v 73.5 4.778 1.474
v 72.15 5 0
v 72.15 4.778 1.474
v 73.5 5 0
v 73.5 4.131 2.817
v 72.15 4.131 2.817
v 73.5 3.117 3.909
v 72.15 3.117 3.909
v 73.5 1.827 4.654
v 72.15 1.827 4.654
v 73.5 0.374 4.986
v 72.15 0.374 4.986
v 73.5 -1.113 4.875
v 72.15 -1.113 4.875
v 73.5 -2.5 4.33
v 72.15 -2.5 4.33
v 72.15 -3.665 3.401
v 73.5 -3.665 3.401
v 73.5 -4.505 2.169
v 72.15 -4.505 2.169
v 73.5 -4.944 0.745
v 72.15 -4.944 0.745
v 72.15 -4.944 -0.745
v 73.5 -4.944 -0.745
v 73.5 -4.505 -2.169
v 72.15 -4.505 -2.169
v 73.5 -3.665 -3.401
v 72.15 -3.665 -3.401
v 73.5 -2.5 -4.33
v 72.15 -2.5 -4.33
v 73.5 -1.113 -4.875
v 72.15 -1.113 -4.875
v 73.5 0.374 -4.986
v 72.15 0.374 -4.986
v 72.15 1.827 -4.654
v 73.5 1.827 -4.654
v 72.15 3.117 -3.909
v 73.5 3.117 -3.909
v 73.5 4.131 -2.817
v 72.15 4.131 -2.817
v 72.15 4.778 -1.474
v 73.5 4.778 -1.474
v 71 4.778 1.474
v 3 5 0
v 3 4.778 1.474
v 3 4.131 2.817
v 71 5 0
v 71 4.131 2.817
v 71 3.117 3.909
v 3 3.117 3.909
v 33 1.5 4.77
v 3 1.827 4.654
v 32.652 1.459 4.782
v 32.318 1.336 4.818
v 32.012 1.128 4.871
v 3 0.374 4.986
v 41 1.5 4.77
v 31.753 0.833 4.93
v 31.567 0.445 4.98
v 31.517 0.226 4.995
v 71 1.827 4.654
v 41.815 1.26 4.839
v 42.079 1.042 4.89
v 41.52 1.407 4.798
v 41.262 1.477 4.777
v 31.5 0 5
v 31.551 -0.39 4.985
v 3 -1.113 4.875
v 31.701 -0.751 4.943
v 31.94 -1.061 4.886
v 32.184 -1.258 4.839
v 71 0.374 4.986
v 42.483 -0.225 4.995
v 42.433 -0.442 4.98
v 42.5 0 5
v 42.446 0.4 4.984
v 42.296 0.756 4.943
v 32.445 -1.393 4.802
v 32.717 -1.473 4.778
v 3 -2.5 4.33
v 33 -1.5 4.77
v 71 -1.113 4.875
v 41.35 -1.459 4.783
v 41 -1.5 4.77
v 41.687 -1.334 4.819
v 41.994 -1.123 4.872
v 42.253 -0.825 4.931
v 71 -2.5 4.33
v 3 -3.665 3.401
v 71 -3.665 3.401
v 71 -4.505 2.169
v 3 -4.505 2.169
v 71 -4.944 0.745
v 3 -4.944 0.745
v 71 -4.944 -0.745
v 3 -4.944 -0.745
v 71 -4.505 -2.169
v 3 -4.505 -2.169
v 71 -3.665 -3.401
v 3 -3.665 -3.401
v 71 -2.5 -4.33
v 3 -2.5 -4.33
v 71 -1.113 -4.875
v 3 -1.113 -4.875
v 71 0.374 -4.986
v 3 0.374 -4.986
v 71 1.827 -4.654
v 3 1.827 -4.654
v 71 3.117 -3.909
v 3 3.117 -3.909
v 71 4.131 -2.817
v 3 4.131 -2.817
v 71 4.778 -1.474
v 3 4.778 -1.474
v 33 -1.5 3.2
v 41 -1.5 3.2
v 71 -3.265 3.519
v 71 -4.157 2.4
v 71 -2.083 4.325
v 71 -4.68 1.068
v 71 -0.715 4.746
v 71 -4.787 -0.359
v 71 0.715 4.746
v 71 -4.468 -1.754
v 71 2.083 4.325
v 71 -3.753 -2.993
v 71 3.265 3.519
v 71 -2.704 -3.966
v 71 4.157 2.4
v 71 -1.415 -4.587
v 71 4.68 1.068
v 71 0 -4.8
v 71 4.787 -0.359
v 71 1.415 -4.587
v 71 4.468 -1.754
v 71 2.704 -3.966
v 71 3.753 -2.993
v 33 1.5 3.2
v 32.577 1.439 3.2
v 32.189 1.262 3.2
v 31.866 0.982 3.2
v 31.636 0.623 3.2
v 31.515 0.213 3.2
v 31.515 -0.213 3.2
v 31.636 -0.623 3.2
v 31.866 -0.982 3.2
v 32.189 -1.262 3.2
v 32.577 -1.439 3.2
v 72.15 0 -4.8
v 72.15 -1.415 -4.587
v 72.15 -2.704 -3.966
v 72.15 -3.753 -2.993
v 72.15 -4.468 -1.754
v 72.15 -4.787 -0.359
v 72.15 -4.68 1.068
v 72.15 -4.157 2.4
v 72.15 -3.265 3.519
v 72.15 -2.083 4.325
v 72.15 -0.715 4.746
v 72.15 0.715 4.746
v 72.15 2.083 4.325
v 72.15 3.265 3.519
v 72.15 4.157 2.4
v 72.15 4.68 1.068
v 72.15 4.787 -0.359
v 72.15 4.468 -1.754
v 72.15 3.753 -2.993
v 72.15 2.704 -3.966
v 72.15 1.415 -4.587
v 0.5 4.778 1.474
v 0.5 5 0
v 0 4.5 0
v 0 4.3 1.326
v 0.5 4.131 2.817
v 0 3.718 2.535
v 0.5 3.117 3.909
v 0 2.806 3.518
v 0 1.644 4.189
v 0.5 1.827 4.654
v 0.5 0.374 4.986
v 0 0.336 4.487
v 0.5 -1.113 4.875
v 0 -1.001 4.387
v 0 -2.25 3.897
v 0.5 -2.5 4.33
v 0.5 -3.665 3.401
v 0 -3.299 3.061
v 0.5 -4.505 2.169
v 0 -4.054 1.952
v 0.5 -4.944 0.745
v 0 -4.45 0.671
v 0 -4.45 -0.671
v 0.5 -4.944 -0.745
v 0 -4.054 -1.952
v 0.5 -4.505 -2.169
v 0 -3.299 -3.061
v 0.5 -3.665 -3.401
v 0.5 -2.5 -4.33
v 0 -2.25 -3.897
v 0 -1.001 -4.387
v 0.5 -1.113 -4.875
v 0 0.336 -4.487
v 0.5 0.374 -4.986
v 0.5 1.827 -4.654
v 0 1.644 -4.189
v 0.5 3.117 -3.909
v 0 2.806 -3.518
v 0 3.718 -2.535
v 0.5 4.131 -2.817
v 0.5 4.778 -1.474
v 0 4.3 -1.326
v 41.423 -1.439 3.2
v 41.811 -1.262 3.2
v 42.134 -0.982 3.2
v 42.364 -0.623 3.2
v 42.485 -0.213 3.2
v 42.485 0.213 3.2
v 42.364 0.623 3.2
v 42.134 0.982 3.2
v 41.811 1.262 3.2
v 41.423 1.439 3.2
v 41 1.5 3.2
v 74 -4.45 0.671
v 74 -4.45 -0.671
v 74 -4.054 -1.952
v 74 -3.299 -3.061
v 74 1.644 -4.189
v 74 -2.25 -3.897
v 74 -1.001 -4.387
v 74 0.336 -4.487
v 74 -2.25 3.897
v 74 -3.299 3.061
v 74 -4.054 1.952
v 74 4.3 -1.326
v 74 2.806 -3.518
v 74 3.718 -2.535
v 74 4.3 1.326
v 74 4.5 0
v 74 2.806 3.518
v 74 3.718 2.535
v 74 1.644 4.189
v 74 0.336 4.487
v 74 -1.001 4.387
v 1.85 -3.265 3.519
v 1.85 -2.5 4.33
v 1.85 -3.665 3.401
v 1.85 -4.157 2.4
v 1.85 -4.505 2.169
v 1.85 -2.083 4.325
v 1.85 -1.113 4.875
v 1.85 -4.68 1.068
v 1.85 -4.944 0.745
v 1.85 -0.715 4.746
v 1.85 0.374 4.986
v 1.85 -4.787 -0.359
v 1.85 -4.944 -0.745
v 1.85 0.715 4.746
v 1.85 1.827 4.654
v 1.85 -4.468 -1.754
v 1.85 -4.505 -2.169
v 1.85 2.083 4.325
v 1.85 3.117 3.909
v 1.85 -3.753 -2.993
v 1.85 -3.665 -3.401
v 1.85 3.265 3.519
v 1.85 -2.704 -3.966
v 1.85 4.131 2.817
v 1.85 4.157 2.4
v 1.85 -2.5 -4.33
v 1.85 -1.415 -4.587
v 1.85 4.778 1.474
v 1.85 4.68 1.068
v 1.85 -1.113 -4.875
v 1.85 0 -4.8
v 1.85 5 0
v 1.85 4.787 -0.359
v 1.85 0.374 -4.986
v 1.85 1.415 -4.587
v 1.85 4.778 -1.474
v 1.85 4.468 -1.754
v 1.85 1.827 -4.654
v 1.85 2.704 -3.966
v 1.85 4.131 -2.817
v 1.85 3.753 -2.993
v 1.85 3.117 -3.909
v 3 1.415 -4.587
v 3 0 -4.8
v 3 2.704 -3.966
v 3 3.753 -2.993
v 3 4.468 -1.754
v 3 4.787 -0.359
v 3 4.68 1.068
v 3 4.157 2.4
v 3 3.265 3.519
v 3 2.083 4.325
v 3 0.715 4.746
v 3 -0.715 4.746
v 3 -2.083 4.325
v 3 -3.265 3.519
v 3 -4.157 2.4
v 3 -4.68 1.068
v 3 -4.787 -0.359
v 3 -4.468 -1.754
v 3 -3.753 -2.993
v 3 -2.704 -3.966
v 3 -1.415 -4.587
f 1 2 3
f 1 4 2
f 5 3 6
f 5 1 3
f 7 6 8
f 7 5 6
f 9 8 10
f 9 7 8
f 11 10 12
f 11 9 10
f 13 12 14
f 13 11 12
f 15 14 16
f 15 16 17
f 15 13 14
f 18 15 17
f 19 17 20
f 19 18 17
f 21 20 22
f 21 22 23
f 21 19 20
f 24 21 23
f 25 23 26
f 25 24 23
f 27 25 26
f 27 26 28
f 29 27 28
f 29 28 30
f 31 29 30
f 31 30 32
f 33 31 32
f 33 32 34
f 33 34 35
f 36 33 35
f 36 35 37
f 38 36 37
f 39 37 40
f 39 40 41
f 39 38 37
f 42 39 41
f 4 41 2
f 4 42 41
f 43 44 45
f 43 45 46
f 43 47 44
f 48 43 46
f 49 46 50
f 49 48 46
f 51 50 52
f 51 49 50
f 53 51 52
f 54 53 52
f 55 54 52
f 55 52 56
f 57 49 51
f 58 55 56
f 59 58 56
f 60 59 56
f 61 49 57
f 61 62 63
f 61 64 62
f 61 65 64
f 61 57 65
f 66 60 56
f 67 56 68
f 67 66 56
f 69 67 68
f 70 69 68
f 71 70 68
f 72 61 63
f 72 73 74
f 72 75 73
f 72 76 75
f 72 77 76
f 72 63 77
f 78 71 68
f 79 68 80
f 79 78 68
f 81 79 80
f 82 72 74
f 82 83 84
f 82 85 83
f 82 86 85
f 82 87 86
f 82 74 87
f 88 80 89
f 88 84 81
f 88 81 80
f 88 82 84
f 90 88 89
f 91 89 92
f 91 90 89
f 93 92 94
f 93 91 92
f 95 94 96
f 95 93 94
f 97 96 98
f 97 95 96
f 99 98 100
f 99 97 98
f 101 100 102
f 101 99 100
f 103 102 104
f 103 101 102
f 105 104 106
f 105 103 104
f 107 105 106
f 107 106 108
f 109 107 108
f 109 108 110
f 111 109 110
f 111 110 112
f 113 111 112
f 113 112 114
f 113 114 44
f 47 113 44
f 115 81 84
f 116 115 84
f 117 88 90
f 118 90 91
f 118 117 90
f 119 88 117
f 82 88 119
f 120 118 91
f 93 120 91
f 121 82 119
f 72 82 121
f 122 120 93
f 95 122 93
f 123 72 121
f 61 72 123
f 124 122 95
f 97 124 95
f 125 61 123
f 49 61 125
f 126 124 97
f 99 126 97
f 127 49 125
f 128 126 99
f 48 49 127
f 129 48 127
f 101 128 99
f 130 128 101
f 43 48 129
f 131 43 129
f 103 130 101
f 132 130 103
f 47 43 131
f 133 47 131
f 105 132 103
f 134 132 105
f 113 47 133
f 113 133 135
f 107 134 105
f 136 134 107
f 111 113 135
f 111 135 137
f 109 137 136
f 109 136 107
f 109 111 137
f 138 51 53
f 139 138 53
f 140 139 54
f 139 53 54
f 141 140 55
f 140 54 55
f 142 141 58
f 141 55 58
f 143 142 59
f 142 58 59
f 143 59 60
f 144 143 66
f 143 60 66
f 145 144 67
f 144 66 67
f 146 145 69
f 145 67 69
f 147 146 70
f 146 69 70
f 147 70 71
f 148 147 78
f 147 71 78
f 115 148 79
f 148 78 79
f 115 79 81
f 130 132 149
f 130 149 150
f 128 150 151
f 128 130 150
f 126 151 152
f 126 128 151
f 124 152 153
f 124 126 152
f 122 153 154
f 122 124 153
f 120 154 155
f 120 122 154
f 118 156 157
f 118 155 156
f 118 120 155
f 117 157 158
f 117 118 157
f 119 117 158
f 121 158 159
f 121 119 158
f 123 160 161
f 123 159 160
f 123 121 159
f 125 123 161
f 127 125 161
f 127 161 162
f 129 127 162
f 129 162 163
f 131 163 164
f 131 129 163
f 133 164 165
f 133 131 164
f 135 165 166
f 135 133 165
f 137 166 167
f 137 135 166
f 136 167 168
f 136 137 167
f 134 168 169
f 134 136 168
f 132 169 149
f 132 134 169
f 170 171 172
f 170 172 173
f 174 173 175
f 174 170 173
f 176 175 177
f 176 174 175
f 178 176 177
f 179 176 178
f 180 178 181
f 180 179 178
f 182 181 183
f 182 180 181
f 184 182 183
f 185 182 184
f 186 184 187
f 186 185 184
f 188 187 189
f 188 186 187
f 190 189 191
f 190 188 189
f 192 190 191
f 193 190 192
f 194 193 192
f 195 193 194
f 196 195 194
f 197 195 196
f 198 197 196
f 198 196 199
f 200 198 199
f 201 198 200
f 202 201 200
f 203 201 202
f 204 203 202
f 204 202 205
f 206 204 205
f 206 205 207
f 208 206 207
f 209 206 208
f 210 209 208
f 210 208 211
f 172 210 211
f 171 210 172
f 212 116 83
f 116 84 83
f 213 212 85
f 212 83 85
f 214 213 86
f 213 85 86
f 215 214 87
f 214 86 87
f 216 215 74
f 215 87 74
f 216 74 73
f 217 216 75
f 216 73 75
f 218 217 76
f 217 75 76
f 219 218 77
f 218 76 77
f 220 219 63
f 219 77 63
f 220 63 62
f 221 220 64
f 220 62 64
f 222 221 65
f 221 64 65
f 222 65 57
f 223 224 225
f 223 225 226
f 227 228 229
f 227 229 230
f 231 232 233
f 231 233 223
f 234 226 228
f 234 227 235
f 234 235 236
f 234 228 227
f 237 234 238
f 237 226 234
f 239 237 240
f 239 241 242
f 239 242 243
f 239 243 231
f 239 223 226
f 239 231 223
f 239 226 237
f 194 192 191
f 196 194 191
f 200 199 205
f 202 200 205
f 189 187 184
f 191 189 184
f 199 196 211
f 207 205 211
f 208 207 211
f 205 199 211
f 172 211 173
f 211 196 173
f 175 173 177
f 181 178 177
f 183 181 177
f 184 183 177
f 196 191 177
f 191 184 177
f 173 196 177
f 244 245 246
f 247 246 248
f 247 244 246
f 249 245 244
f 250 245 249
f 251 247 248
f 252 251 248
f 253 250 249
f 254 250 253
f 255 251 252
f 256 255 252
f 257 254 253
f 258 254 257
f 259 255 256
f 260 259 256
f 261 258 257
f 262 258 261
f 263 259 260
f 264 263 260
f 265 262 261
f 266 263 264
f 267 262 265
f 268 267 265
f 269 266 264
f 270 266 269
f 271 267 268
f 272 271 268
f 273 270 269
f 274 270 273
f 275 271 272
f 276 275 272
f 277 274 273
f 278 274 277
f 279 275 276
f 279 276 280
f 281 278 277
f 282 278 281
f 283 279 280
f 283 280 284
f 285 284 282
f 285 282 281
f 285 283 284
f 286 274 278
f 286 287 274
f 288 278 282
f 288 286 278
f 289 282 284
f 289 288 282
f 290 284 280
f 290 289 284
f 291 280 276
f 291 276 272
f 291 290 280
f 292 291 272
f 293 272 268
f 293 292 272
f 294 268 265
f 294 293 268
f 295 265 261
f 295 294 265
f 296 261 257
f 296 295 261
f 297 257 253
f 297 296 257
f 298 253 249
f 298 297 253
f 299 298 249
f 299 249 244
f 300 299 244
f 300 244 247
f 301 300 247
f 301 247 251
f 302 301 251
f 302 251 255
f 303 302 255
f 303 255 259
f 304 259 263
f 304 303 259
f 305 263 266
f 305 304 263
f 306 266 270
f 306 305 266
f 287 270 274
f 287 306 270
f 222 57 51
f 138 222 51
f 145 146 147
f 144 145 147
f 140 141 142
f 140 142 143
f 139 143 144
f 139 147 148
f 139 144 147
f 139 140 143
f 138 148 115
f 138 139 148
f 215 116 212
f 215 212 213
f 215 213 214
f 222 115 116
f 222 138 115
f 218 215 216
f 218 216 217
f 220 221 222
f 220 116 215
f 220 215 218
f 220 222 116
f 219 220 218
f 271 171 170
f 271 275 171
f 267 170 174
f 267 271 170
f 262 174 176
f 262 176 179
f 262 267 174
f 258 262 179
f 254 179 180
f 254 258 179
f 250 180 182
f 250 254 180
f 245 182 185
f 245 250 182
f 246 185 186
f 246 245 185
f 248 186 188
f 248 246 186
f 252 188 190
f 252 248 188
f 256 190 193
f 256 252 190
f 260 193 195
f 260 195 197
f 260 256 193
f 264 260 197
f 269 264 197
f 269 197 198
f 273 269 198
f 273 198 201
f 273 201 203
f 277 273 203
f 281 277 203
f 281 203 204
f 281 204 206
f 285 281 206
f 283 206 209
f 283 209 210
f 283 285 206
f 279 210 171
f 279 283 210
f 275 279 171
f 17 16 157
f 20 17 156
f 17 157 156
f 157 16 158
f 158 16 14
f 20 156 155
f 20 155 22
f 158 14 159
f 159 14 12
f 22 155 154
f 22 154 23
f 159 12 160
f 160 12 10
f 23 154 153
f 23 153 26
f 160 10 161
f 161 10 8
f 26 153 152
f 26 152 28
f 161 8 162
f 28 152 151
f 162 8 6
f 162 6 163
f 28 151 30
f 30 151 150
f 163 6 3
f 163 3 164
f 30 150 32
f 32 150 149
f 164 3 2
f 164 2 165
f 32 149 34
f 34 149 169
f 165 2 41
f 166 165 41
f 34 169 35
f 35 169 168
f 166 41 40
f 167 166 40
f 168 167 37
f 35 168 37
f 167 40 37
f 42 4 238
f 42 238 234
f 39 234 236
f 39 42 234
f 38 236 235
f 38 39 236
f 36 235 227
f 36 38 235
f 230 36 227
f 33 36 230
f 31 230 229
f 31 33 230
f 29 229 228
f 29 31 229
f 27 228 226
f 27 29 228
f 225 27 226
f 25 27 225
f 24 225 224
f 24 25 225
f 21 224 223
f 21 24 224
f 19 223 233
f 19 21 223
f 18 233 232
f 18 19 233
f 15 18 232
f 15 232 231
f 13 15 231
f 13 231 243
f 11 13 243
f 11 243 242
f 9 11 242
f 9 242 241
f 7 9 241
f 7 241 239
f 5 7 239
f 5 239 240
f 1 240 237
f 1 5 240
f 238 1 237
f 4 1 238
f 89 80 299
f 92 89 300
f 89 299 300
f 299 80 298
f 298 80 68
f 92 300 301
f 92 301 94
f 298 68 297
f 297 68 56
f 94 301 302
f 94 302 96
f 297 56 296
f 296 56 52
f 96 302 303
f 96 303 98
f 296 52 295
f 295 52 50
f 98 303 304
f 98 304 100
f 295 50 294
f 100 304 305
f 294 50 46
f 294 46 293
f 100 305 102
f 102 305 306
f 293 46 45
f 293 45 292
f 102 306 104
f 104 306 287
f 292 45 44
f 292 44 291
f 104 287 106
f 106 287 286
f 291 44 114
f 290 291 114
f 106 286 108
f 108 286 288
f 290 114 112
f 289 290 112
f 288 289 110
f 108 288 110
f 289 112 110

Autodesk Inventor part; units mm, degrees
sketch "Sketch_1" plane through (0, 0, 0) normal (0, 0, 1) x (1, 0, 0)
  line L0 (74, 0) -> (0, 0)
  line L1 (0, 0) -> (0, 4.5)
  line L2 (0, 4.5) -> (0.5, 5)
  line L3 (0.5, 5) -> (73.5, 5)
  line L4 (73.5, 5) -> (74, 4.5)
  line L5 (74, 4.5) -> (74, 0)
  line L6 (74, 0) -> (0, 0)
revolve "Revolution1" add sketch "Sketch_1" angle 360 about axis through (74, 0, 0) along (1, 0, 0)
sketch "_____10" plane through (0, 0, 5) normal (0, 0, 1) x (1, 0, 0)
  arc A0 (33, 1.5) -> (33, -1.5) centre (33, 0) ccw
  line L0 (33, -1.5) -> (41, -1.5)
  arc A1 (41, -1.5) -> (41, 1.5) centre (41, 0) ccw
  line L1 (41, 1.5) -> (33, 1.5)
extrude "Extrusion1" cut sketch "_____10" against normal blind 1.8
sketch "_____5" plane through (3, 0, 0) normal (1, 0, 0) x (0, 0, -1)
  circle A0 centre (0, 0) radius 10
  circle A1 centre (0, 0) radius 4.8
extrude "Extrusion2" cut sketch "_____5" against normal blind 1.15
sketch "_____6" plane through (71, 0, 0) normal (1, 0, 0) x (0, 0, -1)
  circle A0 centre (0, 0) radius 10
  circle A1 centre (0, 0) radius 4.8
extrude "Extrusion3" cut sketch "_____6" along normal blind 1.15
ref_plane "COMBINATION_MODULE_XY" through (0, 0, 0) normal (1, 0, 0) x (0, 0, -1)
ref_plane "COMBINATION_MODULE_YZ" through (0, 0, 0) normal (0, 0, -1) x (0, 1, 0)
ref_plane "COMBINATION_MODULE_ZX" through (0, 0, 0) normal (0, 1, 0) x (1, 0, 0)
ref_plane "to_ring_b_XY" through (2.425, 0, 0) normal (1, 0, 0) x (0, 0, -1)
ref_plane "to_ring_b_YZ" through (2.425, 0, 0) normal (0, 0, -1) x (0, 1, 0)
ref_plane "to_ring_b_ZX" through (2.425, 0, 0) normal (0, 1, 0) x (1, 0, 0)
ref_plane "to_ring_s_XY" through (71.575, 0, 0) normal (1, 0, 0) x (0, 0, -1)
ref_plane "to_ring_s_YZ" through (71.575, 0, 0) normal (0, 0, -1) x (0, 1, 0)
ref_plane "to_ring_s_ZX" through (71.575, 0, 0) normal (0, 1, 0) x (1, 0, 0)
properties part number "NSFMRRA10-74-B3-S3-KC31.5-A11(000_000)_s"
